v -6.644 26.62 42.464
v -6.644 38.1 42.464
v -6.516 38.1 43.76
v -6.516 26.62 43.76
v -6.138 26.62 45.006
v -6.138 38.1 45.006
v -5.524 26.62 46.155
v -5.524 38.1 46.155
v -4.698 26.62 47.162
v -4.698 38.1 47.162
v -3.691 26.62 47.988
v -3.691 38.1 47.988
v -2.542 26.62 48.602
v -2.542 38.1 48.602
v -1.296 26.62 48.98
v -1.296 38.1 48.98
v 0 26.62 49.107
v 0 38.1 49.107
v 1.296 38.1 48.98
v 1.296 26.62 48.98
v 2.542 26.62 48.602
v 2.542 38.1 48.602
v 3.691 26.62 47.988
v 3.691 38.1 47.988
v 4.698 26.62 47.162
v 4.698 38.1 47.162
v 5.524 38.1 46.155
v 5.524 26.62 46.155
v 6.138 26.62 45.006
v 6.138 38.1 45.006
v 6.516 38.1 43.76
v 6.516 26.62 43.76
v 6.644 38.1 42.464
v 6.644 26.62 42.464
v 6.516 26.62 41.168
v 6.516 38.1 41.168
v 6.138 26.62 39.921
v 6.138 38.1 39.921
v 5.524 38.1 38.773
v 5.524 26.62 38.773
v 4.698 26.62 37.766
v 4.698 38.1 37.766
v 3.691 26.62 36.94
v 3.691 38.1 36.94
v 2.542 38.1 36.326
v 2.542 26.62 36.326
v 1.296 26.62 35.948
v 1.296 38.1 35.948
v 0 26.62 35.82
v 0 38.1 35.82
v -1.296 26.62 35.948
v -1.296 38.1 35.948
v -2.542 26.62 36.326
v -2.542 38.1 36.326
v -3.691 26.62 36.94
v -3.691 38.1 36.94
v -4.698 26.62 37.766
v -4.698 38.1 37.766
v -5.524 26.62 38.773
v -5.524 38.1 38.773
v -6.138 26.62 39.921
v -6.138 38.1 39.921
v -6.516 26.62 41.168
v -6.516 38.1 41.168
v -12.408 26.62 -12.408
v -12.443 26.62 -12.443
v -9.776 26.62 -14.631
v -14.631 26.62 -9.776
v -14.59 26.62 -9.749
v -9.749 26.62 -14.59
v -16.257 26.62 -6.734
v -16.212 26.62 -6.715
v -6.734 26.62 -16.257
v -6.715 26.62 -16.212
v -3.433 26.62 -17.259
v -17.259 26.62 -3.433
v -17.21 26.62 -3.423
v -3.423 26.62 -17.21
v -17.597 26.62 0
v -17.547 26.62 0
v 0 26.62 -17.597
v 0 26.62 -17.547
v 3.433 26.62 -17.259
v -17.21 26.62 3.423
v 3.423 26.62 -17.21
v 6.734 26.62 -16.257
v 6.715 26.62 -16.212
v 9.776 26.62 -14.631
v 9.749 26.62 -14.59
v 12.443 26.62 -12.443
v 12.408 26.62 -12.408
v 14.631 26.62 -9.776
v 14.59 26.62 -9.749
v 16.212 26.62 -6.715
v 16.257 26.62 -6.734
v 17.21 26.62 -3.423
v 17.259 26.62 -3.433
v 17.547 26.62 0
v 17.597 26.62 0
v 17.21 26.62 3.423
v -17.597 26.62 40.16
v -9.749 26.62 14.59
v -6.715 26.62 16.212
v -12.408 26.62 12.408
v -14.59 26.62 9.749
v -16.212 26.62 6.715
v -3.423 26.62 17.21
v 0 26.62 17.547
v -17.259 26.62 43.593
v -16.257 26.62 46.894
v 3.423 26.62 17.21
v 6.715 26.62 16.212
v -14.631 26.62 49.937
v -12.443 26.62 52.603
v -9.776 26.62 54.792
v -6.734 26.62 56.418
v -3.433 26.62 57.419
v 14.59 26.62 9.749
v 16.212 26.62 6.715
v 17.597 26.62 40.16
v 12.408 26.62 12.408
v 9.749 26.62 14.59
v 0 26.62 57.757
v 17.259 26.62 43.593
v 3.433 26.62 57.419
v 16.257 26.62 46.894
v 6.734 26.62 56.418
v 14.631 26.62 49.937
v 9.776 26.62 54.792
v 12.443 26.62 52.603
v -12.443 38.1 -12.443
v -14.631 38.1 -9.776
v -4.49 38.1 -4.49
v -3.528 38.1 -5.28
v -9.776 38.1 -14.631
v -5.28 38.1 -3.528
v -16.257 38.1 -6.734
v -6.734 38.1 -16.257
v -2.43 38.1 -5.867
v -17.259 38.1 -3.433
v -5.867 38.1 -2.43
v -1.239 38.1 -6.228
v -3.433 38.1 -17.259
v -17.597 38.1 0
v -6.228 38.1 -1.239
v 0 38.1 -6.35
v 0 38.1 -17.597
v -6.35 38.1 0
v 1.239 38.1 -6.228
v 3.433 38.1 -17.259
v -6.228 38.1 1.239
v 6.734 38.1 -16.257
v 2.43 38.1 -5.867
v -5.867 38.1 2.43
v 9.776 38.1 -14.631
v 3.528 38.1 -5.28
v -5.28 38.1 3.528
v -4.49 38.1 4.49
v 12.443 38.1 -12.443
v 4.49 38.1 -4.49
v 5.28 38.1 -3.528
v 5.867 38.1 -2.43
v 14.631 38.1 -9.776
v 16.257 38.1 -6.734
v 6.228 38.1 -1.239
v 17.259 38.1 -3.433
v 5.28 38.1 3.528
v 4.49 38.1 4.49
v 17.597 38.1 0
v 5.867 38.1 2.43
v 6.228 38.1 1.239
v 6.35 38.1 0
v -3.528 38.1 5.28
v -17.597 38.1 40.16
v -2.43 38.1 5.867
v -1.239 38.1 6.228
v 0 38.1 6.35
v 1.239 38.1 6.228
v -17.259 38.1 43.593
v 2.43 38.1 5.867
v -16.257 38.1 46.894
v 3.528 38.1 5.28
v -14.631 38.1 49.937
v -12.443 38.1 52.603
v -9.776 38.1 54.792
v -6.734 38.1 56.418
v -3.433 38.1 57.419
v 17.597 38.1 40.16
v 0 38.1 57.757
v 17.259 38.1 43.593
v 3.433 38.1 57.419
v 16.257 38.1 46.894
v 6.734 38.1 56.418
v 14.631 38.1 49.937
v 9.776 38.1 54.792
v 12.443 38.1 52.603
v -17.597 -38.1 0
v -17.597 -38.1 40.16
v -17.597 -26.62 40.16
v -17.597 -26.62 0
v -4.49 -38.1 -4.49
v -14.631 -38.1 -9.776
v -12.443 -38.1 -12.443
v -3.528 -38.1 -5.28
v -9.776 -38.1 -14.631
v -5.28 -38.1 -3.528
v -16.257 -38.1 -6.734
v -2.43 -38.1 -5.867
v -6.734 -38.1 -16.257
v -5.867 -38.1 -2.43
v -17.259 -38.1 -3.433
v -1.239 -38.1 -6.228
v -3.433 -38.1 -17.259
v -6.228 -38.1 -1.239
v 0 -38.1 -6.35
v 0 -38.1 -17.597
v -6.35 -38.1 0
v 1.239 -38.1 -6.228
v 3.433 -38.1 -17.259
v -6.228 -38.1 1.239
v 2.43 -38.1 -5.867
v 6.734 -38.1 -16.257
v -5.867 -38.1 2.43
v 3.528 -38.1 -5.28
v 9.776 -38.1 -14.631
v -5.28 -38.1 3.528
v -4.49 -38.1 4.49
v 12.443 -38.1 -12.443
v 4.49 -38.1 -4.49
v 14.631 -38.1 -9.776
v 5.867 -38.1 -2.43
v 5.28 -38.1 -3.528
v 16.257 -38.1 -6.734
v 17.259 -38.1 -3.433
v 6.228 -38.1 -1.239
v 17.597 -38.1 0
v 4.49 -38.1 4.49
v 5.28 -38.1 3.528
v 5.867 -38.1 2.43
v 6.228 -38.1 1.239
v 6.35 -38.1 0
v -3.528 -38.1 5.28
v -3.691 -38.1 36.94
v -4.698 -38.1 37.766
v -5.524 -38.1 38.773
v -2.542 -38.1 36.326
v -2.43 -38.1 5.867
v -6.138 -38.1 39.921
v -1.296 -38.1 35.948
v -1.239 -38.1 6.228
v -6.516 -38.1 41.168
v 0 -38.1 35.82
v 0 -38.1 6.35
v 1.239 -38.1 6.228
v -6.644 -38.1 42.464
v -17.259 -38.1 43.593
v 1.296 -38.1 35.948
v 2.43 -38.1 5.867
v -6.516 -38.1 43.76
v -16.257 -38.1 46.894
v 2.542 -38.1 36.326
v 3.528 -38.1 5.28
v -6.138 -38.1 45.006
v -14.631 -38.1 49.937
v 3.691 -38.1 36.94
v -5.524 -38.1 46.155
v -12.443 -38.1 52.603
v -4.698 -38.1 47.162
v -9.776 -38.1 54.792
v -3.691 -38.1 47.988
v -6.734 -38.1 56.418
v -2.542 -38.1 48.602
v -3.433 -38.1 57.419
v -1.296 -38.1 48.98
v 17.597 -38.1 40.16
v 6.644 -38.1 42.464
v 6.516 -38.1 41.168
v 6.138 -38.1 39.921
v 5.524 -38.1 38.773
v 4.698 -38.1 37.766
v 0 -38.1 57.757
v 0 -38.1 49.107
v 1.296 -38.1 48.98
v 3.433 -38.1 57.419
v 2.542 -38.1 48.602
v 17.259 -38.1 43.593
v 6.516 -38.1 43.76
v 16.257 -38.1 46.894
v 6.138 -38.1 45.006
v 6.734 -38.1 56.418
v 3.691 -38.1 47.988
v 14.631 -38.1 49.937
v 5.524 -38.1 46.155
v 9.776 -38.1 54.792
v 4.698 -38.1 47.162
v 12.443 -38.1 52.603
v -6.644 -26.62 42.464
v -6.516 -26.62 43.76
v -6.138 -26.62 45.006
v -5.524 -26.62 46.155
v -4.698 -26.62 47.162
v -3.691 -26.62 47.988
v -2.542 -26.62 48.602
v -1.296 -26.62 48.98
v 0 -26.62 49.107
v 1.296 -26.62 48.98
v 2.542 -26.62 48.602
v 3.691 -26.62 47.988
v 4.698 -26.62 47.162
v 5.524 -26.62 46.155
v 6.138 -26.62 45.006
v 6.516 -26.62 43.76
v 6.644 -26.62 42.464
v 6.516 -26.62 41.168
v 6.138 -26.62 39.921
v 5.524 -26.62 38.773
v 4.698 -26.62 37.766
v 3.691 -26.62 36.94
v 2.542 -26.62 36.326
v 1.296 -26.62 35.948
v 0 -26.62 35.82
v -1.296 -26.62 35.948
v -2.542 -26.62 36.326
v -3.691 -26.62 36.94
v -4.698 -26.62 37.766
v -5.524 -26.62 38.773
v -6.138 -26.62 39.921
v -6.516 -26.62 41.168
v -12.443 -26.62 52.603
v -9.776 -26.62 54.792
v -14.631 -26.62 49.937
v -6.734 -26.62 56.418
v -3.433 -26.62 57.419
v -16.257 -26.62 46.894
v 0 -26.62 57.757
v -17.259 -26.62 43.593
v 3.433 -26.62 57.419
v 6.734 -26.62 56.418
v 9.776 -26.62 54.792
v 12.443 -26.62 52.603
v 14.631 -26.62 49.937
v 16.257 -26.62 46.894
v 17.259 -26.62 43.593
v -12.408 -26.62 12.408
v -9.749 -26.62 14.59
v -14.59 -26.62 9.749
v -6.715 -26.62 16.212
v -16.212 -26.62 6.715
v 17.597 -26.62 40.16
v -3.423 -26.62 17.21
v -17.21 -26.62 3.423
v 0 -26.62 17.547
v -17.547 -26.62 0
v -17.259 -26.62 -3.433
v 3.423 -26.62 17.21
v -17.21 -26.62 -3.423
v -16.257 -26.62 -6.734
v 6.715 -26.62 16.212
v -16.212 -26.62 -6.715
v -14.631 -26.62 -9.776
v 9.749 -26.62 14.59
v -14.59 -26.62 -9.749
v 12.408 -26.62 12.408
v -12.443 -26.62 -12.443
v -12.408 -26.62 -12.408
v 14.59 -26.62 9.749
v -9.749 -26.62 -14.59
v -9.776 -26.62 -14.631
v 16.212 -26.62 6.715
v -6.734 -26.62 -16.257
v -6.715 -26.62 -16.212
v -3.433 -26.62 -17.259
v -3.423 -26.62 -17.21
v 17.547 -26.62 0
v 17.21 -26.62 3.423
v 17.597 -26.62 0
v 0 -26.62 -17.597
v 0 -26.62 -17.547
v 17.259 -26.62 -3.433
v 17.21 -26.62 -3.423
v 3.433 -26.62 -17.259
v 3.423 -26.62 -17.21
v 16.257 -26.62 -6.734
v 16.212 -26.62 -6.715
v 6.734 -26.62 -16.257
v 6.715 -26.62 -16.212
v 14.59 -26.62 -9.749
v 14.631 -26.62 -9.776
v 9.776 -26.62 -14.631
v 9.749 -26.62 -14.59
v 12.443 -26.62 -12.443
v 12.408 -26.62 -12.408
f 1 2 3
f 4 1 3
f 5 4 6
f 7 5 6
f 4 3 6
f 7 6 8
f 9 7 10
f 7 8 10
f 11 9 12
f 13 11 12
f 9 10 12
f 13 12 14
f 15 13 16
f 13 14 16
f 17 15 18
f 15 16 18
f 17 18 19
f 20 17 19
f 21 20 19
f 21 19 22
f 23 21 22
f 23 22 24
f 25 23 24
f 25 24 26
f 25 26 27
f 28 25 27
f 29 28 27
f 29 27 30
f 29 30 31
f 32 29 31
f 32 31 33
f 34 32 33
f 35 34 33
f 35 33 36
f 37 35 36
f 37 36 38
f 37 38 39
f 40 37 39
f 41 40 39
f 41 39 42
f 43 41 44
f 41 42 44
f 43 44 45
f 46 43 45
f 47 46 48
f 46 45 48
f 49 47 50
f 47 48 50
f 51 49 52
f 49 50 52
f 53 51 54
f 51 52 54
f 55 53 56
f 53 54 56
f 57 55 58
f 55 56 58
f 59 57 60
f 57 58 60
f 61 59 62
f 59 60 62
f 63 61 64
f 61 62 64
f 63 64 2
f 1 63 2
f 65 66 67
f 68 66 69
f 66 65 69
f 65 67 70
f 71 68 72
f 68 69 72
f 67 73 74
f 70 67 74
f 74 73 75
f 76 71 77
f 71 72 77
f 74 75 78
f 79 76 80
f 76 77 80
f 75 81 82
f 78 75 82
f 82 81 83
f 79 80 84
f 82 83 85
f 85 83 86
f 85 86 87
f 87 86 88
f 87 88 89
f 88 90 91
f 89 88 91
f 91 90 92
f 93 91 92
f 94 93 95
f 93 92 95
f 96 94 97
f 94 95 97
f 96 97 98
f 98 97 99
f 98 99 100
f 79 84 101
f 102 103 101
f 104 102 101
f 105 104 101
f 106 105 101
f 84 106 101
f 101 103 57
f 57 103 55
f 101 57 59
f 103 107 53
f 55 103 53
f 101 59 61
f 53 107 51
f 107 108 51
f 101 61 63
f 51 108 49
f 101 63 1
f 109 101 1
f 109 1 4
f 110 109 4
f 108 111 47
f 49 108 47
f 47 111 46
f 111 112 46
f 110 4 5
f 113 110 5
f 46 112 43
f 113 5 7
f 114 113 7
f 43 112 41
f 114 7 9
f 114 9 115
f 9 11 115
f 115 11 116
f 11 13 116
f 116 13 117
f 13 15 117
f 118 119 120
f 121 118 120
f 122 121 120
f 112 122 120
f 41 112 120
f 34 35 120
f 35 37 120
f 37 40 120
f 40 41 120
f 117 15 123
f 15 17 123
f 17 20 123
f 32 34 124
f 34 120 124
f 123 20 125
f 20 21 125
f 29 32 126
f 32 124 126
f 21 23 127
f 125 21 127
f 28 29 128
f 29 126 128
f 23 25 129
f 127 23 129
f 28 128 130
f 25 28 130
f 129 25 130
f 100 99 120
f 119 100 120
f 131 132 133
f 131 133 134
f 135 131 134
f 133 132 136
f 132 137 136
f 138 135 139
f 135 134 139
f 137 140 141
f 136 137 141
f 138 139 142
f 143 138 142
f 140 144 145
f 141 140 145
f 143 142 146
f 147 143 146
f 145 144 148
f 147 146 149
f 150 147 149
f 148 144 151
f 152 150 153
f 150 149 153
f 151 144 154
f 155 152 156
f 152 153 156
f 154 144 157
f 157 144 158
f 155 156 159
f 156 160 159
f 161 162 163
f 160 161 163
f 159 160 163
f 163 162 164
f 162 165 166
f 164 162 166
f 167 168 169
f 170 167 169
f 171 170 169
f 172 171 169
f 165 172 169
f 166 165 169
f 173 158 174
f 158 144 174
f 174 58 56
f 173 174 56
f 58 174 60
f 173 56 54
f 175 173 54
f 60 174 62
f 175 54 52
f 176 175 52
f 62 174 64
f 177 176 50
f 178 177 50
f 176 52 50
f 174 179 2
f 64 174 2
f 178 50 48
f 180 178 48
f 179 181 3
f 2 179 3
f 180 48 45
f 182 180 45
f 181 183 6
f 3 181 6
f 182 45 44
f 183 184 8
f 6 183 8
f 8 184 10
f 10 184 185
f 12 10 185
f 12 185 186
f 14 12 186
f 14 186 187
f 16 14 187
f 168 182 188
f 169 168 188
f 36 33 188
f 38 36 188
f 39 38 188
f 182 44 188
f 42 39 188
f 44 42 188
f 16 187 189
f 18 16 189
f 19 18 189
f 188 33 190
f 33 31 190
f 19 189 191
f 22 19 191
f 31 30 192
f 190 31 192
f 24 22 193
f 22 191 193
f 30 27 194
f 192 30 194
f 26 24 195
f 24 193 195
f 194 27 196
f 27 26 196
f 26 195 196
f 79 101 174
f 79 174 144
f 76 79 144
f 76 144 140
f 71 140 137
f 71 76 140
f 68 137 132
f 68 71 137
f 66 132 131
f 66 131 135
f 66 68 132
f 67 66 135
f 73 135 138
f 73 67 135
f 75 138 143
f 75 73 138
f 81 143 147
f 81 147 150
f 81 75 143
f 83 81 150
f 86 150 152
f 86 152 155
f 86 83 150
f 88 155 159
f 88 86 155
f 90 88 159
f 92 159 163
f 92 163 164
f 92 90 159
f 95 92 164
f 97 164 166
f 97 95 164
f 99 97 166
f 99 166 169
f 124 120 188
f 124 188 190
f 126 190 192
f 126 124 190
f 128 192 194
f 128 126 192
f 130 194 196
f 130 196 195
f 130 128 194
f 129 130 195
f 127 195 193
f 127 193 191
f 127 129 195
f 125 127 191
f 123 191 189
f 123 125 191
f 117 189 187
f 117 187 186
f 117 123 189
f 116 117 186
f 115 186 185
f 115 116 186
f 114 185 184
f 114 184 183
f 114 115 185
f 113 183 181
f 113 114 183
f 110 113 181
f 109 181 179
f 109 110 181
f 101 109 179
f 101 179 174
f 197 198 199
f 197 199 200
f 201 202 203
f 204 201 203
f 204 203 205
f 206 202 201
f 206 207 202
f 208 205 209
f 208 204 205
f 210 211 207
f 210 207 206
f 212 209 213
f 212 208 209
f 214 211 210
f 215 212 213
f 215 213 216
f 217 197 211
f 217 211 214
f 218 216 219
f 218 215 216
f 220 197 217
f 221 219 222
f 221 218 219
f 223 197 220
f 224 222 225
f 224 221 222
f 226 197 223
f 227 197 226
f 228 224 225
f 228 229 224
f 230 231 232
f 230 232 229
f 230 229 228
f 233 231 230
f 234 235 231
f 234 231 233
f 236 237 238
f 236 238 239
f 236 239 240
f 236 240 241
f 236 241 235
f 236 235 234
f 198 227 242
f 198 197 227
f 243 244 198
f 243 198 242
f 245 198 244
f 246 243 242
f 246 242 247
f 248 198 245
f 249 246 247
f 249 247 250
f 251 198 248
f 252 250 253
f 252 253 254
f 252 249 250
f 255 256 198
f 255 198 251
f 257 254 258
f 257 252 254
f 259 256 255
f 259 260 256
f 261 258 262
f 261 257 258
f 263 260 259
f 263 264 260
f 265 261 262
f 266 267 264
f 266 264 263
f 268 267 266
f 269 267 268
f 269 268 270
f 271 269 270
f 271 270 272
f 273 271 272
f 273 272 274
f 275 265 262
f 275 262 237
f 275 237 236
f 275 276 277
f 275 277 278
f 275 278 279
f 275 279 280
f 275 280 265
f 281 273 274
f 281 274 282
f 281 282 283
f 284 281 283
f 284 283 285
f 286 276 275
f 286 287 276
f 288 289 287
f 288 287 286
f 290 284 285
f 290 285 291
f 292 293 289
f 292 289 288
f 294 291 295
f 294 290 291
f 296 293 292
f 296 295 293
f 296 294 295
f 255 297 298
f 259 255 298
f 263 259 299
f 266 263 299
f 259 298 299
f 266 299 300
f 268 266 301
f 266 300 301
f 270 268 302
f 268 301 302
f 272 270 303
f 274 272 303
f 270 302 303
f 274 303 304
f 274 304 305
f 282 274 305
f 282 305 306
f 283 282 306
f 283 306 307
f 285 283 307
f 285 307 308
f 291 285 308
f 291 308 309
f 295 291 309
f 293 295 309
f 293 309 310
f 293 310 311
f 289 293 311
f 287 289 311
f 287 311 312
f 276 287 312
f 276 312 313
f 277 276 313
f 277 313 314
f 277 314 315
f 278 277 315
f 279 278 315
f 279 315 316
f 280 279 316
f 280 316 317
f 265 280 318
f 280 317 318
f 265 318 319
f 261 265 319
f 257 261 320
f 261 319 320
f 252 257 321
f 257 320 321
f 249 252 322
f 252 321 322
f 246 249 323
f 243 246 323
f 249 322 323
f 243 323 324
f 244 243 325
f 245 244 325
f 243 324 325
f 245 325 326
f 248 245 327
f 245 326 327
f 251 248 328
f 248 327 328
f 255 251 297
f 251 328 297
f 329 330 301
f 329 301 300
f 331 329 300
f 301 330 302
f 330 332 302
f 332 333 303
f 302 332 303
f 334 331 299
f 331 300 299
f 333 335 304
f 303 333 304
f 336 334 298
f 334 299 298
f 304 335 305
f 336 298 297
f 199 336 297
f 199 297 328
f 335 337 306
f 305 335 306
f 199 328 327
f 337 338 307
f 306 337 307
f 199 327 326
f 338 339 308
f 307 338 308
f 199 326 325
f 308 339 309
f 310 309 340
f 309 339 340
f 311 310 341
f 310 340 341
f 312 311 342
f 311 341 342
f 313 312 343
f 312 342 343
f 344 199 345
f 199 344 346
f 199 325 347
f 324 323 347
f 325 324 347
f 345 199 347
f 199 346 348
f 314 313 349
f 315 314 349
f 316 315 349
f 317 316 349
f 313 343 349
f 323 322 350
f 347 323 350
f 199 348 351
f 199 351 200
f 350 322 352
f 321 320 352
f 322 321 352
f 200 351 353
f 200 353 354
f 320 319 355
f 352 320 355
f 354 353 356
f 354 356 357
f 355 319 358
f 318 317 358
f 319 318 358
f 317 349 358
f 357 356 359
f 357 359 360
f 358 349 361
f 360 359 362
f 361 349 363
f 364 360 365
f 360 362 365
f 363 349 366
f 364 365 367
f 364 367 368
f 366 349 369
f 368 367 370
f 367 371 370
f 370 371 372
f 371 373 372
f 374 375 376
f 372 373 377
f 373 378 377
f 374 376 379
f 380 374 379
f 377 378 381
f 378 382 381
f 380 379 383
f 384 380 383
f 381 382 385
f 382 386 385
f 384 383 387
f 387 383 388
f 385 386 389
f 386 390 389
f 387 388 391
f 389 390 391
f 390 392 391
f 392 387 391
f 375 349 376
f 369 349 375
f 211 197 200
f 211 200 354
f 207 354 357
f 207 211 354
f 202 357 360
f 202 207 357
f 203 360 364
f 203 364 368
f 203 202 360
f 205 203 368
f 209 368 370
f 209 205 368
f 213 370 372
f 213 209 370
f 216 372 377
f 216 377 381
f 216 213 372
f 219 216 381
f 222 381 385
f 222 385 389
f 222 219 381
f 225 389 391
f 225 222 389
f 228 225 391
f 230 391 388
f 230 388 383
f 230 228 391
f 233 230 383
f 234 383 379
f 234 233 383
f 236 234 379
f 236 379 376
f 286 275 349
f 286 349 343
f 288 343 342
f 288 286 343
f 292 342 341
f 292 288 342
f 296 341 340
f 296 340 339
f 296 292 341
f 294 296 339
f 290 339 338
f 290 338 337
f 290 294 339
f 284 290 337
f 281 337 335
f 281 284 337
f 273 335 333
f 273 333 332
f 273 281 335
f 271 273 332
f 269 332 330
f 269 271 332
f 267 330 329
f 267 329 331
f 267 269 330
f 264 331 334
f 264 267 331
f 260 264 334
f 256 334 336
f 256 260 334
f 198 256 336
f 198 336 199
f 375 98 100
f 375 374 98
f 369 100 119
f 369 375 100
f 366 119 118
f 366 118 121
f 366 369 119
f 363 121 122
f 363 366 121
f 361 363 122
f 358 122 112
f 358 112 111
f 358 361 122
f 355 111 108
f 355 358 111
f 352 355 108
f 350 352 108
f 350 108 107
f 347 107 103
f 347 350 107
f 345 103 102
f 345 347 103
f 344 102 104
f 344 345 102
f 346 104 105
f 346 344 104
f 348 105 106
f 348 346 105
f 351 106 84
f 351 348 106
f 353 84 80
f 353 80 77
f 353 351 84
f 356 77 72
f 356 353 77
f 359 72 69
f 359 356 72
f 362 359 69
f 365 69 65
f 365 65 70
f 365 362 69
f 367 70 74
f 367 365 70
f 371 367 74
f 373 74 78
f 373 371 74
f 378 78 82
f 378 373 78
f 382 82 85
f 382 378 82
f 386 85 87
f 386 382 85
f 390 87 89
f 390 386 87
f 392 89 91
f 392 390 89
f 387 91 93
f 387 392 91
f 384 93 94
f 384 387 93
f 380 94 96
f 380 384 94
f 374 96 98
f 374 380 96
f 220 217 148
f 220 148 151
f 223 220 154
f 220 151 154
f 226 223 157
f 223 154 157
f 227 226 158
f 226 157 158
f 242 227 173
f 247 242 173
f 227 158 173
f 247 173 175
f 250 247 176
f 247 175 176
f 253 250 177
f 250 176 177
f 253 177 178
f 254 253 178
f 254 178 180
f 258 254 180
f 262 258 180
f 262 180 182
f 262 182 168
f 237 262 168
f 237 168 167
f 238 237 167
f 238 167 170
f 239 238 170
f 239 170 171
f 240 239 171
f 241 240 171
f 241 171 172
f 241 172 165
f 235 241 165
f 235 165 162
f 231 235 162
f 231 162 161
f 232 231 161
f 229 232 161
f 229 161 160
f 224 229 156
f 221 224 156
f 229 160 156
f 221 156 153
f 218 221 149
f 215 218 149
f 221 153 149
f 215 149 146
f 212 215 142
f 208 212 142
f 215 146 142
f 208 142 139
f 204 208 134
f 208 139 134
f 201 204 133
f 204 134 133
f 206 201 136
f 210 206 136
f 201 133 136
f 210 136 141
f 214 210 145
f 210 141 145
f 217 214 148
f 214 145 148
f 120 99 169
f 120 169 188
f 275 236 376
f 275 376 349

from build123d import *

# Parameters (mm, degrees)
F1_DEPTH  = 38.1
F2_W      = 53.239736706
F2_H      = 40.1604212821
F3_DEPTH  = 50.8
F4_R      = 17.5474664262
F5_DEPTH  = 38.1
F9_D      = 12.7
F10_R     = 6.6436508829
F11_DEPTH = 127


# Not quite as in the source:
# - a feature of the source that left no trace in its solid (it failed there, or was rolled back) is left out


with BuildPart() as f1:
    # F0 (on Front) → F1 (new body, symmetric)
    with BuildSketch(Plane.XZ):
        with BuildLine():
            ThreePointArc((-17.5968260456, 40.1604212821), (0, 22.5635952364), (17.5968260456, 40.1604212821))
            ThreePointArc((17.5968260456, 40.1604212821), (0, 57.7572473277), (-17.5968260456, 40.1604212821))
        make_face()
        with BuildLine():
            ThreePointArc((-17.5968260456, 0), (0, -17.5968260456), (17.5968260456, 0))
            ThreePointArc((17.5968260456, 0), (0, 17.5968260456), (-17.5968260456, 0))
        make_face()
        with BuildLine():
            ThreePointArc((-17.5968260456, 0), (0, 17.5968260456), (17.5968260456, 0))
            Line((17.5968260456, 0), (17.5968260456, 40.1604212821))
            ThreePointArc((17.5968260456, 40.1604212821), (0, 22.5635952364), (-17.5968260456, 40.1604212821))
            Line((-17.5968260456, 40.1604212821), (-17.5968260456, 0))
        make_face()
    extrude(amount=F1_DEPTH, both=True)

    # F2 (on face) → F3 (cut)
    with BuildSketch(Plane.YZ.offset(17.5968260456)):
        Polygon((0, 66.9256597757), (-26.619868353, 66.9256597757), (-26.619868353, 40.1604212821), (26.619868353, 40.1604212821), (26.619868353, 66.9256597757), align=None)
        with Locations((0, 20.080210641)):
            Rectangle(F2_W, F2_H)
        Polygon((26.619868353, 0), (-26.619868353, 0), (-26.619868353, -26.9206576049), (0, -26.9206576049), (26.619868353, -26.9206576049), align=None)
    extrude(amount=-F3_DEPTH, mode=Mode.SUBTRACT)

    # F4 (on Front) → F5 (join, symmetric)
    with BuildSketch(Plane.XZ):
        Circle(F4_R)
    extrude(amount=F5_DEPTH, both=True)

    # F9 (through all)
    with Locations(Plane.XZ.offset(38.1)):
        with Locations((0, 0)):
            Hole(F9_D / 2)

    # F10 (on face) → F11 (cut)
    with BuildSketch(Plane(origin=(0, 38.1, 0), x_dir=(-1, 0, 0), z_dir=(0, 1, 0))):
        with Locations((0, 42.4637757242)):
            Circle(F10_R)
    extrude(amount=-F11_DEPTH, mode=Mode.SUBTRACT)


solid = f1.part
